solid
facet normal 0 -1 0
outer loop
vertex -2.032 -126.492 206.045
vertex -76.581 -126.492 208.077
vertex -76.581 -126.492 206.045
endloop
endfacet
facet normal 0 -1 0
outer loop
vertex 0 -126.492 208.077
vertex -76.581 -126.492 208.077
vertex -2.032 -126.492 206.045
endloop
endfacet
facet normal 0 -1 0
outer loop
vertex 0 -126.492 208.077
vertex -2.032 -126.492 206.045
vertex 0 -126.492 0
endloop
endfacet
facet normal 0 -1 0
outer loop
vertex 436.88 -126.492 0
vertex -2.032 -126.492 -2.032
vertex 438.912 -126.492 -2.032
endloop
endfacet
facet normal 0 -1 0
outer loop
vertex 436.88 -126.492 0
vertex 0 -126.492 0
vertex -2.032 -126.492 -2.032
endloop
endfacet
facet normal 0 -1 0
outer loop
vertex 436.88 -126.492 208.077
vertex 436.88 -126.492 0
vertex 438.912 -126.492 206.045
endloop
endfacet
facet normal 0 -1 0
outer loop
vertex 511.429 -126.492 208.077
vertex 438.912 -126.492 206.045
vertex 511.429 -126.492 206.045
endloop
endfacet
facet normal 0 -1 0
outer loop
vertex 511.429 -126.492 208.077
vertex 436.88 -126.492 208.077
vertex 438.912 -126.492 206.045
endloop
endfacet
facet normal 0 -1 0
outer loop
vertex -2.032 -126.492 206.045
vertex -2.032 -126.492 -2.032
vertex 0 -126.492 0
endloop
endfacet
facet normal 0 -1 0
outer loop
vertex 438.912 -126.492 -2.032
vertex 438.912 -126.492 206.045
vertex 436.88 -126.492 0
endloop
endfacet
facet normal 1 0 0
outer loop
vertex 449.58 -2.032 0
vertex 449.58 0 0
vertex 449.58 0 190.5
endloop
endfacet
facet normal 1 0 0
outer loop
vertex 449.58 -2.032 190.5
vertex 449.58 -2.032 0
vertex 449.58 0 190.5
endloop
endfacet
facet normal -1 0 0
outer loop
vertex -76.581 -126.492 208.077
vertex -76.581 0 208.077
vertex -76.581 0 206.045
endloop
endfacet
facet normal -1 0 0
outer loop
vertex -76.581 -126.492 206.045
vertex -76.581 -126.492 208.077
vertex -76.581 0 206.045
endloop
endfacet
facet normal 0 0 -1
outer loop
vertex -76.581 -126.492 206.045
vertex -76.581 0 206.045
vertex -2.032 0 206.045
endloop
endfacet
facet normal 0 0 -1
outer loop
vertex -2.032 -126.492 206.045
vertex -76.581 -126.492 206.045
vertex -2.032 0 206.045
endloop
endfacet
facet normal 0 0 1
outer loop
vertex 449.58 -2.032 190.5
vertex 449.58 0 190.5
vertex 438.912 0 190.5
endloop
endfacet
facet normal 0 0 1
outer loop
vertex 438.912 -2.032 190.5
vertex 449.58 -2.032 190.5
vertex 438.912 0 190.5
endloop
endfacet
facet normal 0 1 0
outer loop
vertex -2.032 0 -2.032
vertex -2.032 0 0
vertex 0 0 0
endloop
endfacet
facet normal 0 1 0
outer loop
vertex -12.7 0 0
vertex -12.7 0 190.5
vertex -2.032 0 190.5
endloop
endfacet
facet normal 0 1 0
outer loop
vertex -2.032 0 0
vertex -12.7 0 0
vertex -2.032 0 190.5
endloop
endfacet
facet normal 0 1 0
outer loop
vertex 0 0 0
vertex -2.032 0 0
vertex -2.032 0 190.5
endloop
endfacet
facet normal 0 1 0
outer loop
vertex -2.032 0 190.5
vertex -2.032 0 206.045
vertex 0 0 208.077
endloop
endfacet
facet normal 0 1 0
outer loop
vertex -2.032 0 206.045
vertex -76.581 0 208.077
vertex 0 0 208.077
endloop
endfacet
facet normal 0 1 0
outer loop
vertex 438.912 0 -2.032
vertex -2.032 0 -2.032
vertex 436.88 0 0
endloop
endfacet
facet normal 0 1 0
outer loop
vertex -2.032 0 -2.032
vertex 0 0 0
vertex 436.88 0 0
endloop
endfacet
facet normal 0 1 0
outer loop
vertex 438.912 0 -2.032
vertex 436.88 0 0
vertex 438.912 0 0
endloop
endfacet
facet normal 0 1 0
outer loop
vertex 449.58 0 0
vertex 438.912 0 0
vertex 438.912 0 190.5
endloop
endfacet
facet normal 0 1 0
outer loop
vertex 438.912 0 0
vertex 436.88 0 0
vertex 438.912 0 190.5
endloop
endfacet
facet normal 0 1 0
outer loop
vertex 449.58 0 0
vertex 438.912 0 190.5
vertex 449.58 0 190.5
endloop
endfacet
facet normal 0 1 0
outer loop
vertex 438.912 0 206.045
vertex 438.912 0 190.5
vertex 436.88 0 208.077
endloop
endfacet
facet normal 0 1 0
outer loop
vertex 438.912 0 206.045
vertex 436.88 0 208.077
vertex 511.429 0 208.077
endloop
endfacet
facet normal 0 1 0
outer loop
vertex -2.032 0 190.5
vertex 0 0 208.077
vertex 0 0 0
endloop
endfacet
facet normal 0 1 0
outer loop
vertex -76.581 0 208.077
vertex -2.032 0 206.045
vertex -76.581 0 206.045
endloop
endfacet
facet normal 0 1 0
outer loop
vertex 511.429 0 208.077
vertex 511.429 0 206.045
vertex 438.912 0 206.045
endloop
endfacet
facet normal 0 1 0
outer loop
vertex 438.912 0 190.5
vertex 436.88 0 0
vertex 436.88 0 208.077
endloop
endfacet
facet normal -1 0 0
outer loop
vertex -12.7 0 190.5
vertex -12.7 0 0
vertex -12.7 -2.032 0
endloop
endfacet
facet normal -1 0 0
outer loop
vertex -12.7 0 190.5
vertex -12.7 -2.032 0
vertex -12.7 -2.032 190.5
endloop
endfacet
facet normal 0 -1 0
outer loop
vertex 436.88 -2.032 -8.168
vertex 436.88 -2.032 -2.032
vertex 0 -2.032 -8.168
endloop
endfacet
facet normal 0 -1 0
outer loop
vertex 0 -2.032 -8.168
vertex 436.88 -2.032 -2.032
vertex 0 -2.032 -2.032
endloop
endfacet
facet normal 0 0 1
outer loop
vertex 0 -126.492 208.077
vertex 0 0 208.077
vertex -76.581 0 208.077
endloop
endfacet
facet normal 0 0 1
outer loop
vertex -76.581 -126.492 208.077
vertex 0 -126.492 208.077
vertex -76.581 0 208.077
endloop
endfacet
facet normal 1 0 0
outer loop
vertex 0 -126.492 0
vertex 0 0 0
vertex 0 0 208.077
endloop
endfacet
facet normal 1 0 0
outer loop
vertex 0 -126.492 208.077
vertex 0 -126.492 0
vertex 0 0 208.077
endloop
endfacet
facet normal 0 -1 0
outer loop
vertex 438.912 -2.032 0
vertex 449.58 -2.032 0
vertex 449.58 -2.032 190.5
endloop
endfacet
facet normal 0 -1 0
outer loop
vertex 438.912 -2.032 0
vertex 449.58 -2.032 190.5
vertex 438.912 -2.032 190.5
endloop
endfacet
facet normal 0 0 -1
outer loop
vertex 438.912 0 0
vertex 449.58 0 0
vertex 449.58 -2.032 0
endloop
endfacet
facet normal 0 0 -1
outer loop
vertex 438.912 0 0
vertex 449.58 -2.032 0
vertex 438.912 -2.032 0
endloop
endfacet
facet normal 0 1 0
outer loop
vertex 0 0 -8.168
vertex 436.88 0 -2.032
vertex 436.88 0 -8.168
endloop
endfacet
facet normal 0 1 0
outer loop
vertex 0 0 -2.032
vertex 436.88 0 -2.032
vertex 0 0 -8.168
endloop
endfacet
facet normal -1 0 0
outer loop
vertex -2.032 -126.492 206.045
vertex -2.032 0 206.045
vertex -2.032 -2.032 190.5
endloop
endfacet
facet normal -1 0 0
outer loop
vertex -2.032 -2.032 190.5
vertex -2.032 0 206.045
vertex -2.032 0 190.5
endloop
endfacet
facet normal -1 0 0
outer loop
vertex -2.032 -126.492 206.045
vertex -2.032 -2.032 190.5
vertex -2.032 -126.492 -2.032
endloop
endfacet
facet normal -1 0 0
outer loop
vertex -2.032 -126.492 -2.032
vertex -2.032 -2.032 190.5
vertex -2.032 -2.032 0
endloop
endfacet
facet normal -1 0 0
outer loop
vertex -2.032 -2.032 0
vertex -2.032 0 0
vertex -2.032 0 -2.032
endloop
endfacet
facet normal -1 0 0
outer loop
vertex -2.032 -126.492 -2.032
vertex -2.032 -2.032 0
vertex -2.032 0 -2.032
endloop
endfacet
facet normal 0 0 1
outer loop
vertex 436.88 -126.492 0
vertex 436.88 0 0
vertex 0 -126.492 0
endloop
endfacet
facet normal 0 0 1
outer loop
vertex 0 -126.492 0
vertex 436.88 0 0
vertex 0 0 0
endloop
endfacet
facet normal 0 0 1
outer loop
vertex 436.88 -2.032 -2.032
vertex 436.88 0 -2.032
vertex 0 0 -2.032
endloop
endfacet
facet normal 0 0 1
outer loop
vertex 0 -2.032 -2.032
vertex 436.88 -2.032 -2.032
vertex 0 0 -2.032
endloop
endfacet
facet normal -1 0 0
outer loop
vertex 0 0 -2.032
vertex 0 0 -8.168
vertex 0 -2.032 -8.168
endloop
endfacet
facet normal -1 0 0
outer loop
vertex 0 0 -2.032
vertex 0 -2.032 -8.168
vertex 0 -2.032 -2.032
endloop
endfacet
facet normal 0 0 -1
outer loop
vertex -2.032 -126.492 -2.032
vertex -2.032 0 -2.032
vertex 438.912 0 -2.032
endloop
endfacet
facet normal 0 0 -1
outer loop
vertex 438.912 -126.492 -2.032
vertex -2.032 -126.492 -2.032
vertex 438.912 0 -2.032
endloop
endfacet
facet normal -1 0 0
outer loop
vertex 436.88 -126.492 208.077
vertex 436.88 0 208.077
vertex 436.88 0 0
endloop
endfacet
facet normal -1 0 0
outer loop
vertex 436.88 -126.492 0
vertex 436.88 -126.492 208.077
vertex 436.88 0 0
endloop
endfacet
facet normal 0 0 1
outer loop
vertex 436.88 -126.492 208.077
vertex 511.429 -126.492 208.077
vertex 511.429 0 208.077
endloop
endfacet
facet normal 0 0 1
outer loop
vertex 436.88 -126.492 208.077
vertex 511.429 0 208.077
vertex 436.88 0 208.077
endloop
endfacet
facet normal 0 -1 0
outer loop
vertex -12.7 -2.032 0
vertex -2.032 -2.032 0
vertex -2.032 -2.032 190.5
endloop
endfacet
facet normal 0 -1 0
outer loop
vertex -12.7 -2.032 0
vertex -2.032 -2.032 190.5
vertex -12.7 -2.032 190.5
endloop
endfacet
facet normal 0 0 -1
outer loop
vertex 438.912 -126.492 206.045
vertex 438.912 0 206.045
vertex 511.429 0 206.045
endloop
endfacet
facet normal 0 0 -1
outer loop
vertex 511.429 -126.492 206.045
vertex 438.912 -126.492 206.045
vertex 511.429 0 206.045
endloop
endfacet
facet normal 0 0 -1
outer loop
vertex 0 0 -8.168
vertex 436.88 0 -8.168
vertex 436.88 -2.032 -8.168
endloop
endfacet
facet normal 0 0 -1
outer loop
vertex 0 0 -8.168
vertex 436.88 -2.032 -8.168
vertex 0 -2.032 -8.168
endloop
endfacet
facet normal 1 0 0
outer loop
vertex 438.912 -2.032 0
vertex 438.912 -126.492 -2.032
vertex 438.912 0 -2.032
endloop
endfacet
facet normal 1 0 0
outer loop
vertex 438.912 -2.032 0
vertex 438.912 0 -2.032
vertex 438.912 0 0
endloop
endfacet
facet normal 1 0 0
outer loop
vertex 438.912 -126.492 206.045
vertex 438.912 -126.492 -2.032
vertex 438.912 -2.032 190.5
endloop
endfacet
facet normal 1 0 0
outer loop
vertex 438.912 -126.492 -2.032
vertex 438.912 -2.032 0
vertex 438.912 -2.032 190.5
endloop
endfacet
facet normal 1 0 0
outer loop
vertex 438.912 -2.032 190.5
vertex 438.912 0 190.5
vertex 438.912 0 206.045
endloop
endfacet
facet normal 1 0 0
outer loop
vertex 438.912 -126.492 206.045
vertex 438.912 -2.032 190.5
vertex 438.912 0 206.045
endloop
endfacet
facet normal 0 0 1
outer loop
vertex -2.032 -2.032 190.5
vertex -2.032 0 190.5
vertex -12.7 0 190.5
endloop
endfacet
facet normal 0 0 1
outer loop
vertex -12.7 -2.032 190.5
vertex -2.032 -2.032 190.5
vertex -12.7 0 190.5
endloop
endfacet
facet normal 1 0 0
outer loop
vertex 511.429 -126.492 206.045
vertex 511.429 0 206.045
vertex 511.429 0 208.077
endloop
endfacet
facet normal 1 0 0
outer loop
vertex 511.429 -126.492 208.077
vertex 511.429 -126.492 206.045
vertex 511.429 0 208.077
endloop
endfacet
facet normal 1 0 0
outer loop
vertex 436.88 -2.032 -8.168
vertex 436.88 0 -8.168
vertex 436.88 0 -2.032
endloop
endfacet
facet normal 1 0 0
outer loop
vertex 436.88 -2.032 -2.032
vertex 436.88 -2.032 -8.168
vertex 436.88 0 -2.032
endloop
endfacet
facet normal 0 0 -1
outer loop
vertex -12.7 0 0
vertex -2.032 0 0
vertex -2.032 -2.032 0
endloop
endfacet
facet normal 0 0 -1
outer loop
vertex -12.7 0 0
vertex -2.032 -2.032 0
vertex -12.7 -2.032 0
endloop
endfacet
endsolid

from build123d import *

# Parameters (mm, degrees)
F1_DEPTH = 126.492
F2_W     = 436.88
F2_H     = 6.1355546244
F3_DEPTH = 2.032
F4_W     = 10.668
F4_H     = 190.5
F5_DEPTH = 2.032


with BuildPart() as f1:
    # F0 (on Front) → F1 (new body)
    with BuildSketch(Plane.XZ):
        Polygon((436.88, 0), (0, 0), (0, 206.0448), (0, 208.0768), (-2.032, 208.0768), (-76.581, 208.0768), (-76.581, 206.0448), (-2.032, 206.0448), (-2.032, 0), (-2.032, -2.032), (0, -2.032), (436.88, -2.032), (438.912, -2.032), (438.912, 0), (438.912, 206.0448), (511.429, 206.0448), (511.429, 208.0768), (436.88, 208.0768), align=None)
    extrude(amount=F1_DEPTH)

    # F4 (on face) → F5 (join)
    with BuildSketch(Plane(origin=(0, 0, 0), x_dir=(-1, 0, 0), z_dir=(0, 1, 0))):
        with Locations((7.366, 95.25)):
            Rectangle(F4_W, F4_H)
        with Locations((-444.246, 95.25)):
            Rectangle(F4_W, F4_H)
    extrude(amount=-F5_DEPTH)


with BuildPart() as f3:
    # F2 (on face) → F3 (new body)
    with BuildSketch(Plane(origin=(0, 0, 0), x_dir=(-1, 0, 0), z_dir=(0, 1, 0))):
        with Locations((-218.44, -5.0997773122)):
            Rectangle(F2_W, F2_H)
    extrude(amount=-F3_DEPTH)


solid = Compound([f1.part, f3.part])
